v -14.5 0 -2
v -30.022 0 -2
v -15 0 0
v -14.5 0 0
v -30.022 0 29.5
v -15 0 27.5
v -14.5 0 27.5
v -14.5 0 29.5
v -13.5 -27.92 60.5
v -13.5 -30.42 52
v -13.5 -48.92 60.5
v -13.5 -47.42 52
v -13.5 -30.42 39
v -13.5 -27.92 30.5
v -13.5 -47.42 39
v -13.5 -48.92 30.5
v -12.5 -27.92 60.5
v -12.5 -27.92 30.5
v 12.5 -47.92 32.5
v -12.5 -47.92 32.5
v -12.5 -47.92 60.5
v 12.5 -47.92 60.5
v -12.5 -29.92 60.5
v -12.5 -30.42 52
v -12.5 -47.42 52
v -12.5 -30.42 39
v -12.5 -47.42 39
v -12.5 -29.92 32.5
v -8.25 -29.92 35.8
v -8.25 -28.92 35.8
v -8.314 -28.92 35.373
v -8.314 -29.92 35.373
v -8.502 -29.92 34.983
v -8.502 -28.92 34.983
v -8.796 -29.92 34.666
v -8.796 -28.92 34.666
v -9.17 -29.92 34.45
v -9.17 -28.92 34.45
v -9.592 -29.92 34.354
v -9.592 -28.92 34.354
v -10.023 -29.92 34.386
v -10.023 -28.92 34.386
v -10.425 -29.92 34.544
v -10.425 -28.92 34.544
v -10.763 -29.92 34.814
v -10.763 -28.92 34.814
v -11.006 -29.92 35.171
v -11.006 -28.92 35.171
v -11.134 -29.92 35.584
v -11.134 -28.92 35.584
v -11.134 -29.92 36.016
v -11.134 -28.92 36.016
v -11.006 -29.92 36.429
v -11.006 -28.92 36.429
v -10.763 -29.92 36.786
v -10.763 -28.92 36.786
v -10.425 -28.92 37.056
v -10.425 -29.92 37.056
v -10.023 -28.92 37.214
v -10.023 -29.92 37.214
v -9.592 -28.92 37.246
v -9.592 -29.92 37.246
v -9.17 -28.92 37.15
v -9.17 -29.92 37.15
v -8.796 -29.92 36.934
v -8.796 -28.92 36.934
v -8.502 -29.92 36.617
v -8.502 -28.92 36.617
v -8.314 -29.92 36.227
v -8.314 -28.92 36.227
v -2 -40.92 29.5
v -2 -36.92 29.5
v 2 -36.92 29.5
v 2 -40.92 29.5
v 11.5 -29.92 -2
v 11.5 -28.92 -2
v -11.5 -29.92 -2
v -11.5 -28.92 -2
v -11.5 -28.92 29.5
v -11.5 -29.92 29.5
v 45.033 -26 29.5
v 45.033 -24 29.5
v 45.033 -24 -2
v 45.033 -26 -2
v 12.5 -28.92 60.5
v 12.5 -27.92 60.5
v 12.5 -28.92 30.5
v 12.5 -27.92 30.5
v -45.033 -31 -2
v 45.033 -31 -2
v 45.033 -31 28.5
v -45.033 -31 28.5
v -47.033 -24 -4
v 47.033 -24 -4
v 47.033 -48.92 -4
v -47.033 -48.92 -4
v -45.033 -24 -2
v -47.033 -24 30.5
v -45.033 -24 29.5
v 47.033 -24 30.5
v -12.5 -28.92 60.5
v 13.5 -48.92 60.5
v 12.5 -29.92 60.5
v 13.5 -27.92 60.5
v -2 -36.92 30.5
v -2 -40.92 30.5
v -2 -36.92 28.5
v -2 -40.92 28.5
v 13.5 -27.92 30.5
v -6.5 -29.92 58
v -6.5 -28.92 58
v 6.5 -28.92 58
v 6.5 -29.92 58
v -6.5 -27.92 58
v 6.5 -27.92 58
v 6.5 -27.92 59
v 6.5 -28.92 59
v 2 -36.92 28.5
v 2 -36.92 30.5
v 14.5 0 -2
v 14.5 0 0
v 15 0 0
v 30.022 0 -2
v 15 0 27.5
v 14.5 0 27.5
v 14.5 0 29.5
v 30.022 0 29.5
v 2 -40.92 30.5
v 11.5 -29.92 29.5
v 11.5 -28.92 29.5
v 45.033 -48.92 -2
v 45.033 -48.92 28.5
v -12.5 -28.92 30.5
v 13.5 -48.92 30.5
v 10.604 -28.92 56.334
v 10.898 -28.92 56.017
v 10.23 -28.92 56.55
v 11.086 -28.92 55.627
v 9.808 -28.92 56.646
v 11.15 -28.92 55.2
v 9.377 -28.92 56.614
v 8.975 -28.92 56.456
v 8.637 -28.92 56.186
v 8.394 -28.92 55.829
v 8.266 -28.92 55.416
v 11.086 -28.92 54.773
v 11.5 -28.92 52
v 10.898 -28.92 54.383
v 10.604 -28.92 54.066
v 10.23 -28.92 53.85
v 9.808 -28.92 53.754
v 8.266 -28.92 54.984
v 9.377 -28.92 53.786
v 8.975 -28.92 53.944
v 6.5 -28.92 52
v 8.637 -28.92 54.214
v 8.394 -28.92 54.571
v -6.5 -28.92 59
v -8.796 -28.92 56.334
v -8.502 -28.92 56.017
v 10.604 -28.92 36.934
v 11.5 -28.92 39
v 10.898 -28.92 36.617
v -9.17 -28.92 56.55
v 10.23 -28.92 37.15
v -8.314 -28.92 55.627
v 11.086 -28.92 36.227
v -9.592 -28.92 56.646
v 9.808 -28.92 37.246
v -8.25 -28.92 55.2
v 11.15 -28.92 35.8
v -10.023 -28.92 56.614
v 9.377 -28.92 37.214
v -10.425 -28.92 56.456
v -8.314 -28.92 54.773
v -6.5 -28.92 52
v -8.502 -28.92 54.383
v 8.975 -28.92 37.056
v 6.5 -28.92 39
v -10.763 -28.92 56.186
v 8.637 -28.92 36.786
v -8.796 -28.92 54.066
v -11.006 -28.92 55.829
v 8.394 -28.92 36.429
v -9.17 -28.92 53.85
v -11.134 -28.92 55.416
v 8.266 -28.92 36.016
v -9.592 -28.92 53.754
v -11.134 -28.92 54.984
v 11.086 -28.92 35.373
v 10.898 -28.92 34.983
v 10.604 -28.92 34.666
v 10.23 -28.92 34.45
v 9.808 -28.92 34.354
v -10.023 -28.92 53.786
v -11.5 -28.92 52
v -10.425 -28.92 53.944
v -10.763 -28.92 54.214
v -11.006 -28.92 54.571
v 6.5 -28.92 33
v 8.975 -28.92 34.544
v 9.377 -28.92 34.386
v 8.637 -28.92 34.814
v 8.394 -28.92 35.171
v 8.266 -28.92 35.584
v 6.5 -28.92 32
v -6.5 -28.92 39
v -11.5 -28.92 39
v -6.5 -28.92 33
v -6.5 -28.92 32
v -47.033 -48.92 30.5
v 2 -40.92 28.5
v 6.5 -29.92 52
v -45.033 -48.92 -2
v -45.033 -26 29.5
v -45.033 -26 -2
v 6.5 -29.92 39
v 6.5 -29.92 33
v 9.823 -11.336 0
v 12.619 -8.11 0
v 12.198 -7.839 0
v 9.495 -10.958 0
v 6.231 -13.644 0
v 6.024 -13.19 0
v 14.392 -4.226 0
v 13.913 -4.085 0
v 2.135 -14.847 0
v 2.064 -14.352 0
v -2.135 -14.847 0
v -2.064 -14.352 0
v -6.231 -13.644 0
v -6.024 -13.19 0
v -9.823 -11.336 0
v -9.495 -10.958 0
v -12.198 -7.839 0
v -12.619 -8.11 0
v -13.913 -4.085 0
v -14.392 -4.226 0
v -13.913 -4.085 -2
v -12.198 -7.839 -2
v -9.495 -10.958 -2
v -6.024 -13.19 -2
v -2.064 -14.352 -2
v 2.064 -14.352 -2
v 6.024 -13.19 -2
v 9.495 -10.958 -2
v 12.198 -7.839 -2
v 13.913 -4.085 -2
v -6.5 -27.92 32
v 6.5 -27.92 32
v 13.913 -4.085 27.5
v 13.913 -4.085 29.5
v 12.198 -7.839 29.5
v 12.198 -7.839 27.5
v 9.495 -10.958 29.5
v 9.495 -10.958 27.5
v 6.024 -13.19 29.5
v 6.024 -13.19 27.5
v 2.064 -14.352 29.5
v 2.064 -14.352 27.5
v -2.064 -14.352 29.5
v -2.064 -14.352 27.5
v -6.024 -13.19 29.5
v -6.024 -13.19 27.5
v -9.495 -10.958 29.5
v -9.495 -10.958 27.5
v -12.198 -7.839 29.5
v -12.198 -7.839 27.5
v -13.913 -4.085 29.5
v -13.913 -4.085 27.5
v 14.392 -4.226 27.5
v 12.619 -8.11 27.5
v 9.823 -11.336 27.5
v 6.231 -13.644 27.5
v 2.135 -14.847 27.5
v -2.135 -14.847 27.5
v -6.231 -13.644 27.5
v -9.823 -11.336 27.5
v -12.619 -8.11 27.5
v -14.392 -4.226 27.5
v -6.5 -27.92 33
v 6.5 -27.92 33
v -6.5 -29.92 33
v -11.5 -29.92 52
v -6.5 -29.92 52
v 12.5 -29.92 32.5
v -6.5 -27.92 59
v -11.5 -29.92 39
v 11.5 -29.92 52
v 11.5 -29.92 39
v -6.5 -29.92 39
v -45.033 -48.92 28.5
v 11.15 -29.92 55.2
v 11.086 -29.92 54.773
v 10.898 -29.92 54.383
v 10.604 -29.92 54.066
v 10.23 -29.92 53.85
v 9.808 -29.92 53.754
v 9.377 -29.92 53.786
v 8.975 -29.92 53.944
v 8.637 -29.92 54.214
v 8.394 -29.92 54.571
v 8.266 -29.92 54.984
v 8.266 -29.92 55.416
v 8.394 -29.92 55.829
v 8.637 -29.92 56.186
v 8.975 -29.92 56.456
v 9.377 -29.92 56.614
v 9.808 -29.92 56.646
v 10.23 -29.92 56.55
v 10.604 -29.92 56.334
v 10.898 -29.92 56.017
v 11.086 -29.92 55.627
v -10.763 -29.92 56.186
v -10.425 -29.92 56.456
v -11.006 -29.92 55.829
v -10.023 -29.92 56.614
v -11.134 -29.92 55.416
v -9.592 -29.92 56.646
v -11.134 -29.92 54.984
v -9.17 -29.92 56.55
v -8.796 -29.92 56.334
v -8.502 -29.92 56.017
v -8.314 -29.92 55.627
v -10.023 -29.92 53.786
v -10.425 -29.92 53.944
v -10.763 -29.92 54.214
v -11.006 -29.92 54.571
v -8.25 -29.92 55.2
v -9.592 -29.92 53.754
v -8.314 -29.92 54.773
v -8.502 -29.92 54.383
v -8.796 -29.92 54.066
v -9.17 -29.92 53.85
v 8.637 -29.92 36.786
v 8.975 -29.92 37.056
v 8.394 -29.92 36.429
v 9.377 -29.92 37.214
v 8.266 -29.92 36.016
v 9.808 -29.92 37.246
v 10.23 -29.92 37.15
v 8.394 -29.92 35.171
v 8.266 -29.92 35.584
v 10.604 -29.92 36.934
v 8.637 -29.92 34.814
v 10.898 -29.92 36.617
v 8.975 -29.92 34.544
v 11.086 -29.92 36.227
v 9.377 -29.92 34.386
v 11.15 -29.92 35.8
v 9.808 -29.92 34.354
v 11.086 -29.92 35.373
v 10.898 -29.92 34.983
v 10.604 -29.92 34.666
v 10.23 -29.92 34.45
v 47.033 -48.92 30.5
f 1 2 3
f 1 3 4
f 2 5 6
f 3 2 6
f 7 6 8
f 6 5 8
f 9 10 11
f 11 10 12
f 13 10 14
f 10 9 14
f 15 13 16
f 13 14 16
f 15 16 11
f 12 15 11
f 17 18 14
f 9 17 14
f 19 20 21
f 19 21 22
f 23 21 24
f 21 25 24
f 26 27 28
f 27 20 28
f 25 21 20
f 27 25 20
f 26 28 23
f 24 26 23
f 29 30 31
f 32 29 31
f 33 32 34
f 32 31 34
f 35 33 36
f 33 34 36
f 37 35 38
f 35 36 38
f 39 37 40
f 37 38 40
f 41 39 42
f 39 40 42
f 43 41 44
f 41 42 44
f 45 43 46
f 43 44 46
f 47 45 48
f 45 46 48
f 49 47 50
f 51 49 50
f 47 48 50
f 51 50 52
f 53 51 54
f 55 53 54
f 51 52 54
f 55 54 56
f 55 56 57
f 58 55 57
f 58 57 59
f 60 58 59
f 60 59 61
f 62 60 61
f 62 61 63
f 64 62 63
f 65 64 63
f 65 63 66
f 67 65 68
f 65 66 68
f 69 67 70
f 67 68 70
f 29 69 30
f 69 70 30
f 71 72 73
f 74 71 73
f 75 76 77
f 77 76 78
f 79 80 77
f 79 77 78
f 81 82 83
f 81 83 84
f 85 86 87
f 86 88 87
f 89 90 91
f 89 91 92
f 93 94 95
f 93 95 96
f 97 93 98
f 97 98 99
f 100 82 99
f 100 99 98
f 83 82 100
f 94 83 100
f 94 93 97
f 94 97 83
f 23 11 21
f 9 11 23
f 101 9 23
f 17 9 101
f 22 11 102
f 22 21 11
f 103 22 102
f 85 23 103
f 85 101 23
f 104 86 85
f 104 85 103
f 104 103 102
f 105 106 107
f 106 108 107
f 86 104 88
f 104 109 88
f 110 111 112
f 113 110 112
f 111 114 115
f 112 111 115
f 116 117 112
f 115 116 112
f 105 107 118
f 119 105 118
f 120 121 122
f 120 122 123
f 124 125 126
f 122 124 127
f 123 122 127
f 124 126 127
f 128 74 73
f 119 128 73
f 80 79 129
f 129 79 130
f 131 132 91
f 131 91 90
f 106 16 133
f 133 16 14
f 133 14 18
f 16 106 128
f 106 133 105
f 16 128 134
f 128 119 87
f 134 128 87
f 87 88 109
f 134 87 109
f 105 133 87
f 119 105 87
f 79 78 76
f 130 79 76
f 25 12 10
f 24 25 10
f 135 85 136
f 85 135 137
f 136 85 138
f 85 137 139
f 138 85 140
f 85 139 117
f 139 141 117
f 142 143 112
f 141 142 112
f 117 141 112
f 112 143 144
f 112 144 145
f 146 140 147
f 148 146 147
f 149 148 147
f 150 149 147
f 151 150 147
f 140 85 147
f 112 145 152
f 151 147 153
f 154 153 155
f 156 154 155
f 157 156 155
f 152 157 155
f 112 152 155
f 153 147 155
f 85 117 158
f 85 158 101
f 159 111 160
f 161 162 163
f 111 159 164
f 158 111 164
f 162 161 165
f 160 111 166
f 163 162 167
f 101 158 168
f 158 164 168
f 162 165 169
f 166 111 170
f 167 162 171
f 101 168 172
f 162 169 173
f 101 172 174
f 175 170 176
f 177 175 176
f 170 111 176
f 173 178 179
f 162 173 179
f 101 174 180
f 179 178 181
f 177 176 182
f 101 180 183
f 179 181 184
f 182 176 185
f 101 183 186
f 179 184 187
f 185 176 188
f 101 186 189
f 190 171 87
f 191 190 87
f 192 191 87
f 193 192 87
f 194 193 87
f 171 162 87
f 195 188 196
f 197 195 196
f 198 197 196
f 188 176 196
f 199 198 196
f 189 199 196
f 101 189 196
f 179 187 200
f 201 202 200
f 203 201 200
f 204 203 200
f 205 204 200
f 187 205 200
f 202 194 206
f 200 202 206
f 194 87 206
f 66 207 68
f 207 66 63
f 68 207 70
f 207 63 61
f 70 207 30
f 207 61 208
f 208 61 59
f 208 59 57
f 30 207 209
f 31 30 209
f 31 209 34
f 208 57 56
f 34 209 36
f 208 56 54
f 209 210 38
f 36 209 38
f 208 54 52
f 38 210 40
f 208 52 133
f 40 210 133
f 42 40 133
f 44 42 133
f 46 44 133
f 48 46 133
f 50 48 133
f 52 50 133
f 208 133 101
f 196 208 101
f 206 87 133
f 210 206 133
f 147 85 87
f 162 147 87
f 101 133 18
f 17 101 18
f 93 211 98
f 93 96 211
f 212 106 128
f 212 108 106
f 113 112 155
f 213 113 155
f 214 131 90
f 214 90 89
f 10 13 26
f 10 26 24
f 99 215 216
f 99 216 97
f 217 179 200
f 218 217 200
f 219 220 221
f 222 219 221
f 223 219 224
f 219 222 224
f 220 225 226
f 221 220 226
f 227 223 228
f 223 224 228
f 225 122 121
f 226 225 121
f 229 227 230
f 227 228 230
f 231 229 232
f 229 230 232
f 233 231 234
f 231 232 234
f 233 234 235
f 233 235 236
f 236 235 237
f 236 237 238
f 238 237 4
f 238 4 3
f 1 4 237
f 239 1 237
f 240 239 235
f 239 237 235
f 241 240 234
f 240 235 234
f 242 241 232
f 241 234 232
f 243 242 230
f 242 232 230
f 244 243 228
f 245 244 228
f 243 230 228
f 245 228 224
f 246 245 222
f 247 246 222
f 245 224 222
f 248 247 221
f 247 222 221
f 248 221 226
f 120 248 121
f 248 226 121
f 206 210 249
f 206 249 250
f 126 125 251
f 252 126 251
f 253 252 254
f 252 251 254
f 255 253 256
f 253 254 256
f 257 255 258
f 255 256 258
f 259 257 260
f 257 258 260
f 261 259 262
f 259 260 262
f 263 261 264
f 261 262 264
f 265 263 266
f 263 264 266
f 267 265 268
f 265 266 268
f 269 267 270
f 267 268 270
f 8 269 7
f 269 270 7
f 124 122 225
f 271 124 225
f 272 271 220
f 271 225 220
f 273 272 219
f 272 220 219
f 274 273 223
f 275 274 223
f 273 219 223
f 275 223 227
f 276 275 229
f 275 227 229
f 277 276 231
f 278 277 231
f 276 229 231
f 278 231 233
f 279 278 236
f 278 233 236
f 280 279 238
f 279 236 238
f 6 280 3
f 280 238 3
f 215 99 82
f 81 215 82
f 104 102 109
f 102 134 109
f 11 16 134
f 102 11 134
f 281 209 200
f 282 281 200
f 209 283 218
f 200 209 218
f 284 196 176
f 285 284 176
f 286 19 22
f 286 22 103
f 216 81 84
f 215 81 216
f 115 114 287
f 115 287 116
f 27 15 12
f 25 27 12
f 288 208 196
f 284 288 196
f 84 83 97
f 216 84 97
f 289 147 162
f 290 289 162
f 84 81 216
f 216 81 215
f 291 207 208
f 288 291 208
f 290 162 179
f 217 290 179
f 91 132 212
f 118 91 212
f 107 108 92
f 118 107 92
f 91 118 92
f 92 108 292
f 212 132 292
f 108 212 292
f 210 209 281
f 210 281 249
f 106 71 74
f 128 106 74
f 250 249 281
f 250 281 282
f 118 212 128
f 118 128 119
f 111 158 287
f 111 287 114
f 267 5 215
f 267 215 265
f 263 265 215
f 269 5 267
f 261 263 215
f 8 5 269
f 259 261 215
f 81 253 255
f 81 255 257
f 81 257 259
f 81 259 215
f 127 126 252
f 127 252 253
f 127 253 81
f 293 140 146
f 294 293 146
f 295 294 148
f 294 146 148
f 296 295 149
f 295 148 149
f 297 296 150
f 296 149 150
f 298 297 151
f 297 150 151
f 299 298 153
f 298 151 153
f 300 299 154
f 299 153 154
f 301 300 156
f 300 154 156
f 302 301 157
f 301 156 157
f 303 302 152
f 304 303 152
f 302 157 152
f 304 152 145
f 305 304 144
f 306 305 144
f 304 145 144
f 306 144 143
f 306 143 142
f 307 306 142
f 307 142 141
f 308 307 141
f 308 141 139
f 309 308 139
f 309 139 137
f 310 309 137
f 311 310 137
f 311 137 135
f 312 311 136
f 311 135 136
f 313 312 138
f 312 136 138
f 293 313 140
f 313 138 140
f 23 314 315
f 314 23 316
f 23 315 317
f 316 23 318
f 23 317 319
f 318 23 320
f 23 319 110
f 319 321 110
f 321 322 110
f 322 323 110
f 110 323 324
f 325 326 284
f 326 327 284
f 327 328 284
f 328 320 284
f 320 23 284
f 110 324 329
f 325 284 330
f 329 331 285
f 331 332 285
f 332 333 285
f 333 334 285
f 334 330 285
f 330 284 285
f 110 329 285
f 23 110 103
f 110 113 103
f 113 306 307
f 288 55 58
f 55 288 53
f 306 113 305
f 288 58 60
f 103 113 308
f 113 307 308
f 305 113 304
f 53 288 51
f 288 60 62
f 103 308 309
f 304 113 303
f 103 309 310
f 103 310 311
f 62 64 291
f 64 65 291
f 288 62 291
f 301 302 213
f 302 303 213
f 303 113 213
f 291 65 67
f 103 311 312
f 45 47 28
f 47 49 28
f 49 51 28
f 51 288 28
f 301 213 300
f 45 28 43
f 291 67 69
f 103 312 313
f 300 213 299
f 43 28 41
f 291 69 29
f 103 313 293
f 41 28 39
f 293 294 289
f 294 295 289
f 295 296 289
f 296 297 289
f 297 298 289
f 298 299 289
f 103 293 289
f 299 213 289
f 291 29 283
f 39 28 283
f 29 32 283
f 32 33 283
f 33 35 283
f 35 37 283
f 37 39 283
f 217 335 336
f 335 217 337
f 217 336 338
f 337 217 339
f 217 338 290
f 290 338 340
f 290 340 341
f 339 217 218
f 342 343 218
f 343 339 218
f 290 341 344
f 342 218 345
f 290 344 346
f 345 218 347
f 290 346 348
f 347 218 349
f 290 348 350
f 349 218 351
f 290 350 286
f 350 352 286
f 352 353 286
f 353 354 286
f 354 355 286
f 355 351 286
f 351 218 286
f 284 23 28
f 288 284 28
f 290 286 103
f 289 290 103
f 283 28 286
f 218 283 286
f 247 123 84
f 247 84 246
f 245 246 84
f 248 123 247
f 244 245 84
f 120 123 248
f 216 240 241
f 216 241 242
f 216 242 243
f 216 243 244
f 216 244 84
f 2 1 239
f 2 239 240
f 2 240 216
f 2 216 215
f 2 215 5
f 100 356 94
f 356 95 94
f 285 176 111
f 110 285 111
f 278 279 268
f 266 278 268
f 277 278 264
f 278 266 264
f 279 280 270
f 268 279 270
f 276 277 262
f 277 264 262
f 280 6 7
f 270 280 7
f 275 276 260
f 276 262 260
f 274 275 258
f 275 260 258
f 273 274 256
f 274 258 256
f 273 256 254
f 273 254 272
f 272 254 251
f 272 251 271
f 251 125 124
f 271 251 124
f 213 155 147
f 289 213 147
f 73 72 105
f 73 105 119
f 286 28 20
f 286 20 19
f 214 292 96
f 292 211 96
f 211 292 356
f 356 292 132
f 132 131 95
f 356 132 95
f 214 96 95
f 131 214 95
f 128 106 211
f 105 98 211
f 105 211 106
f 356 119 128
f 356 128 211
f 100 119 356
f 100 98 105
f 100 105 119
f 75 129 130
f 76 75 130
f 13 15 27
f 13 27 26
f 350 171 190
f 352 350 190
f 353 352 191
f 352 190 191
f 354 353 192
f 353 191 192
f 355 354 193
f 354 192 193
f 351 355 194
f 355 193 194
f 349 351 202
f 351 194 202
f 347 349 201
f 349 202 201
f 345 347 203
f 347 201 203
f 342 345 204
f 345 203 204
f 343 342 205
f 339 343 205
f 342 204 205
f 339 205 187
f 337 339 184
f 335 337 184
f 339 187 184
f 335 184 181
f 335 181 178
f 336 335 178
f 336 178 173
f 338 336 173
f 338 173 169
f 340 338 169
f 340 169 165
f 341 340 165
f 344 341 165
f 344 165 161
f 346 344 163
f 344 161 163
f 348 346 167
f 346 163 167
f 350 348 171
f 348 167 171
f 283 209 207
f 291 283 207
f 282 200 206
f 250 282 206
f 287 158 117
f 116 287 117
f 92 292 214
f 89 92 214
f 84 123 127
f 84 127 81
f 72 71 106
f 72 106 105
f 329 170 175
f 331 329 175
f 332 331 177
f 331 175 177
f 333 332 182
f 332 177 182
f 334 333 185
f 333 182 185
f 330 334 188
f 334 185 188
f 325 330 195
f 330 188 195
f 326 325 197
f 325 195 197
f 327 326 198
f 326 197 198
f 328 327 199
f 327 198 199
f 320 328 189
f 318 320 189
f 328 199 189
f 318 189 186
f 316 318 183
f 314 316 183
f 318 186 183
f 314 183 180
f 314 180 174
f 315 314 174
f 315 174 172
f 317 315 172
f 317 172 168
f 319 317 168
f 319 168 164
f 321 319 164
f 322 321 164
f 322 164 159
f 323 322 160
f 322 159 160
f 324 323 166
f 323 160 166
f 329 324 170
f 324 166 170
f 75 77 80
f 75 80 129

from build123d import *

# Parameters (mm, degrees)
BOSS_EXTRUDE1_DEPTH  = 27.5
BOSS_EXTRUDE2_DEPTH  = 2
BOSS_EXTRUDE3_DEPTH  = 2
ENCODER_RAIL_W       = 23
ENCODER_RAIL_H       = 1
ENCODER_RAIL_W_2     = 4
ENCODER_RAIL_H_2     = 4
BOSS_EXTRUDE6_DEPTH  = 31.5
SKETCH3_W            = 94.066641994
SKETCH3_H            = 24.92
BOSS_EXTRUDE7_DEPTH  = 2
SKETCH4_W            = 94.066641994
SKETCH4_H            = 24.92
BOSS_EXTRUDE8_DEPTH  = 1
SKETCH6_W            = 90.066641994
SKETCH6_H            = 30.5
CUT_EXTRUDE1_DEPTH   = 17.92
BOSS_EXTRUDE10_START = 1
ENCODER_RAIL_9_W     = 4
ENCODER_RAIL_9_H     = 4
ENCODER_RAIL_9_W_2   = 1
ENCODER_RAIL_9_H_2   = 1
BOSS_EXTRUDE10_DEPTH = 2
ENCODER_RAIL_10_W    = 4
ENCODER_RAIL_10_H    = 4
CUT_EXTRUDE2_DEPTH   = 1
ENCODER_RAIL_11_W    = 4
ENCODER_RAIL_11_H    = 4
BOSS_EXTRUDE11_DEPTH = 1
SKETCH8_W            = 25
SKETCH8_H            = 18
BOSS_EXTRUDE12_DEPTH = 28
SKETCH9_R            = 1.45
SKETCH9_W            = 13
SKETCH9_H            = 1
CUT_EXTRUDE4_DEPTH   = 1
SKETCH9_4_W          = 13
SKETCH9_4_H          = 1
BOSS_EXTRUDE13_DEPTH = 1
SKETCH11_W           = 13
SKETCH11_H           = 17
CUT_EXTRUDE5_DEPTH   = 1


with BuildPart() as part:
    # Frame → Boss-Extrude1 (new body)
    with BuildSketch(Plane.XY):
        with BuildLine():
            Line((-45.033320997, -26), (45.033320997, -26))
            Line((45.033320997, -26), (30.022213998, 0))
            Line((30.022213998, 0), (18, 0))
            ThreePointArc((18, 0), (0, -18), (-18, 0))
            Line((-18, 0), (-30.022213998, 0))
            Line((-30.022213998, 0), (-45.033320997, -26))
        make_face()
        with BuildLine():
            ThreePointArc((-18, 0), (0, -18), (18, 0))
            Line((18, 0), (15, 0))
            ThreePointArc((15, 0), (0, -15), (-15, 0))
            Line((-15, 0), (-18, 0))
        make_face()
    extrude(amount=BOSS_EXTRUDE1_DEPTH)

    # lip → Boss-Extrude2 (add)
    with BuildSketch(Plane.XY.offset(27.5)):
        with BuildLine():
            Line((45.033320997, -26), (30.022213998, 0))
            Line((30.022213998, 0), (15, 0))
            ThreePointArc((15, 0), (0, -15), (-15, 0))
            Line((-15, 0), (-30.022213998, 0))
            Line((-30.022213998, 0), (-45.033320997, -26))
            Line((-45.033320997, -26), (45.033320997, -26))
        make_face()
        with BuildLine():
            ThreePointArc((14.5, 0), (0, -14.5), (-14.5, 0))
            Line((-14.5, 0), (-15, 0))
            ThreePointArc((-15, 0), (0, -15), (15, 0))
            Line((15, 0), (14.5, 0))
        make_face()
    extrude(amount=BOSS_EXTRUDE2_DEPTH)

    # lip2 → Boss-Extrude3 (add)
    with BuildSketch(Plane(origin=(0, 0, 0), x_dir=(-1, 0, 0), z_dir=(0, 0, -1))):
        with BuildLine():
            ThreePointArc((15, 0), (0, -15), (-15, 0))
            Line((-15, 0), (-30.022213998, 0))
            Line((-30.022213998, 0), (-45.033320997, -26))
            Line((-45.033320997, -26), (45.033320997, -26))
            Line((45.033320997, -26), (30.022213998, 0))
            Line((30.022213998, 0), (15, 0))
        make_face()
        with BuildLine():
            Line((-14.5, 0), (-15, 0))
            ThreePointArc((-15, 0), (0, -15), (15, 0))
            Line((15, 0), (14.5, 0))
            ThreePointArc((14.5, 0), (0, -14.5), (-14.5, 0))
        make_face()
    extrude(amount=BOSS_EXTRUDE3_DEPTH)


with BuildPart() as body_2:
    # Encoder Rail → Boss-Extrude6 (new body, through all)
    with BuildSketch(Plane.XY.offset(29.5)):
        Polygon((47.033320997, -48.92), (47.033320997, -24), (45.033320997, -24), (45.033320997, -26), (-45.033320997, -26), (-45.033320997, -24), (-47.033320997, -24), (-47.033320997, -48.92), align=None)
        with Locations((0, -29.42)):
            Rectangle(ENCODER_RAIL_W, ENCODER_RAIL_H, mode=Mode.SUBTRACT)
        with Locations((0, -38.92)):
            Rectangle(ENCODER_RAIL_W_2, ENCODER_RAIL_H_2, mode=Mode.SUBTRACT)
    extrude(amount=-BOSS_EXTRUDE6_DEPTH)

    # Sketch3 → Boss-Extrude7 (add)
    with BuildSketch(Plane(origin=(0, 0, -2), x_dir=(-1, 0, 0), z_dir=(0, 0, -1))):
        with Locations((0, -36.46)):
            Rectangle(SKETCH3_W, SKETCH3_H)
    extrude(amount=BOSS_EXTRUDE7_DEPTH)

    # Sketch4 → Boss-Extrude8 (add)
    with BuildSketch(Plane.XY.offset(29.5)):
        with Locations((0, -36.46)):
            Rectangle(SKETCH4_W, SKETCH4_H)
    extrude(amount=BOSS_EXTRUDE8_DEPTH)

    # Sketch6 → Cut-Extrude1 (cut)
    with BuildSketch(Plane(origin=(0, -48.92, 0), x_dir=(-1, 0, 0), z_dir=(0, -1, 0))):
        with Locations((0, -13.25)):
            Rectangle(SKETCH6_W, SKETCH6_H)
    extrude(amount=-CUT_EXTRUDE1_DEPTH, mode=Mode.SUBTRACT)

    # Encoder Rail<10> → Cut-Extrude2 (cut)
    with BuildSketch(Plane.XY.offset(29.5)):
        with Locations((0, -38.92)):
            Rectangle(ENCODER_RAIL_10_W, ENCODER_RAIL_10_H)
    extrude(amount=CUT_EXTRUDE2_DEPTH, mode=Mode.SUBTRACT)


with BuildPart() as body_3:
    # Encoder Rail<9> → Boss-Extrude10 (new body)
    with BuildSketch(Plane.XY.offset(29.5).offset(BOSS_EXTRUDE10_START)):
        Polygon((12.5, -48.92), (13.5, -48.92), (13.5, -28.92), (12.5, -28.92), (12.5, -29.92), align=None)
        Polygon((-12.5, -29.92), (-12.5, -48.92), (12.5, -48.92), (12.5, -29.92), (11.5, -29.92), (-11.5, -29.92), align=None)
        with Locations((0, -38.92)):
            Rectangle(ENCODER_RAIL_9_W, ENCODER_RAIL_9_H, mode=Mode.SUBTRACT)
        with Locations((0, -38.92)):
            Rectangle(ENCODER_RAIL_9_W, ENCODER_RAIL_9_H)
        Polygon((-13.5, -28.92), (-13.5, -48.92), (-12.5, -48.92), (-12.5, -29.92), (-12.5, -28.92), align=None)
        with Locations((-13, -28.42)):
            Rectangle(ENCODER_RAIL_9_W_2, ENCODER_RAIL_9_H_2)
        with Locations((-12, -29.42)):
            Rectangle(ENCODER_RAIL_9_W_2, ENCODER_RAIL_9_H_2)
        Polygon((11.5, -28.92), (0, -28.92), (-11.5, -28.92), (-11.5, -29.92), (11.5, -29.92), align=None)
        with Locations((12, -29.42)):
            Rectangle(ENCODER_RAIL_9_W_2, ENCODER_RAIL_9_H_2)
        with Locations((13, -28.42)):
            Rectangle(ENCODER_RAIL_9_W_2, ENCODER_RAIL_9_H_2)
    extrude(amount=BOSS_EXTRUDE10_DEPTH)

    # Encoder Rail<11> → Boss-Extrude11 (add)
    with BuildSketch(Plane.XY.offset(29.5)):
        with Locations((0, -38.92)):
            Rectangle(ENCODER_RAIL_11_W, ENCODER_RAIL_11_H)
    extrude(amount=BOSS_EXTRUDE11_DEPTH)

    # Sketch8 → Boss-Extrude12 (add)
    with BuildSketch(Plane.XY.offset(32.5)):
        Polygon((-13.5, -48.92), (13.5, -48.92), (13.5, -27.92), (12.5, -27.92), (12.5, -28.92), (-12.5, -28.92), (-12.5, -27.92), (-13.5, -27.92), align=None)
        with Locations((0, -38.92)):
            Rectangle(SKETCH8_W, SKETCH8_H, mode=Mode.SUBTRACT)
    extrude(amount=BOSS_EXTRUDE12_DEPTH)

    # Sketch9 → Cut-Extrude4 (cut)
    with BuildSketch(Plane(origin=(0, -28.92, 0), x_dir=(1, 0, 0), z_dir=(0, 1, 0))):
        Polygon((-6.5, -39), (-11.5, -39), (-11.5, -52), (-6.5, -52), (-6.5, -57), (6.5, -57), (6.5, -52), (11.5, -52), (11.5, -39), (6.5, -39), (6.5, -34), (-6.5, -34), align=None)
        with Locations((9.7, -55.2)):
            Circle(SKETCH9_R)
        with Locations((-9.7, -55.2)):
            Circle(SKETCH9_R)
        with Locations((-9.7, -35.8)):
            Circle(SKETCH9_R)
        with Locations((9.7, -35.8)):
            Circle(SKETCH9_R)
        with Locations((0, -57.5)):
            Rectangle(SKETCH9_W, SKETCH9_H)
        with Locations((0, -33.5)):
            Rectangle(SKETCH9_W, SKETCH9_H)
    extrude(amount=-CUT_EXTRUDE4_DEPTH, mode=Mode.SUBTRACT)

    # Sketch9<4> → Boss-Extrude13 (add)
    with BuildSketch(Plane(origin=(0, -28.92, 0), x_dir=(1, 0, 0), z_dir=(0, 1, 0))):
        with Locations((0, -32.5)):
            Rectangle(SKETCH9_4_W, SKETCH9_4_H)
        with Locations((0, -58.5)):
            Rectangle(SKETCH9_4_W, SKETCH9_4_H)
    extrude(amount=BOSS_EXTRUDE13_DEPTH)

    # Sketch11 → Cut-Extrude5 (cut)
    with BuildSketch(Plane.ZY.offset(13.5)):
        with Locations((45.5, -38.92)):
            Rectangle(SKETCH11_W, SKETCH11_H)
    extrude(amount=-CUT_EXTRUDE5_DEPTH, mode=Mode.SUBTRACT)


solid = Compound([part.part, body_2.part, body_3.part])
